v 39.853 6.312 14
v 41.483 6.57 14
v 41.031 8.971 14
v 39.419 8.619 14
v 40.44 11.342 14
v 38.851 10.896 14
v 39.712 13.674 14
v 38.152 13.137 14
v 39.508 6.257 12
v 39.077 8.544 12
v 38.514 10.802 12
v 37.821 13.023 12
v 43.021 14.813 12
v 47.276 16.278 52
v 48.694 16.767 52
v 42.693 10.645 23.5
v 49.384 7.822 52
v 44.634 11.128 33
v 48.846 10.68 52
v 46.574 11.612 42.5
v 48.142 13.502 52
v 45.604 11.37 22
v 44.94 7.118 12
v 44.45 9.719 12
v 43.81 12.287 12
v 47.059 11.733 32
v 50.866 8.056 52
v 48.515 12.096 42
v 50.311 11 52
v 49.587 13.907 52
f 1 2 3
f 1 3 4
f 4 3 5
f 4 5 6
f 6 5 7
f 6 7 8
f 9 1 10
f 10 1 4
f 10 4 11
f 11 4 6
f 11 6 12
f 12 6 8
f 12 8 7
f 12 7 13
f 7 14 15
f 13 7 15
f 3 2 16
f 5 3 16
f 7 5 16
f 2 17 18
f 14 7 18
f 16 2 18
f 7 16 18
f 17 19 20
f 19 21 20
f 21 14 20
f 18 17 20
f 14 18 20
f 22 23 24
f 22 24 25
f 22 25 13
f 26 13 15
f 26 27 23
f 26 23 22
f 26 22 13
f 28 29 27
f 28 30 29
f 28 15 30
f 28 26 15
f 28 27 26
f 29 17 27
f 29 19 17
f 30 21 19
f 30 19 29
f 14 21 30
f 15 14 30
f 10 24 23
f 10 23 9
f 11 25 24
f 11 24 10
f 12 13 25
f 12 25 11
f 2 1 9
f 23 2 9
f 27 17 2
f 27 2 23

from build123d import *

# Parameters (mm, degrees)
CONE009_ANGLE           = 30
CONE007_ANGLE           = 30
CONE008_ANGLE           = 10
CONE008_PLACEMENT_ANGLE = 9.000003


with BuildPart() as ydra_hank_cutter_nedre:
    # Cone009 → Cone009 (revolve)
    with BuildSketch(Plane(origin=(0, 0, 12), x_dir=(1, 0, 0), z_dir=(0, -1, 0))):
        Polygon((0, 0), (40, 0), (47, 40), (0, 40), align=None)
    revolve(axis=Axis((0, 0, 12), (0, 0, 1)), revolution_arc=CONE009_ANGLE)


with BuildPart() as ydra_hank_cutter:
    # Cone007 → Cone007 (revolve)
    with BuildSketch(Plane(origin=(0, 0, 14), x_dir=(1, 0, 0), z_dir=(0, -1, 0))):
        Polygon((0, 0), (42, 0), (50, 38), (0, 38), align=None)
    revolve(axis=Axis((0, 0, 14), (0, 0, 1)), revolution_arc=CONE007_ANGLE)


with BuildPart() as total_cuttet_hank:
    # Cone008 → Cone008 (revolve)
    with BuildSketch(Plane.XZ):
        Polygon((0, 0), (45.5, 0), (51.5, 40), (0, 40), align=None)
    revolve(axis=Axis((0, 0, 0), (0, 0, 1)), revolution_arc=CONE008_ANGLE)


with BuildPart() as total_cuttet_hank_1:
    # Cone008 placement: moved
    add(total_cuttet_hank.part.moved(Location((0, 0, 12))).rotate(Axis((0, 0, 12), (0, 0, 1)), CONE008_PLACEMENT_ANGLE))

    # Cut006: cut Ydra hank cutter
    add(ydra_hank_cutter.part, mode=Mode.SUBTRACT)

    # Cut007: cut Ydra hank cutter nedre
    add(ydra_hank_cutter_nedre.part, mode=Mode.SUBTRACT)


solid = total_cuttet_hank_1.part
